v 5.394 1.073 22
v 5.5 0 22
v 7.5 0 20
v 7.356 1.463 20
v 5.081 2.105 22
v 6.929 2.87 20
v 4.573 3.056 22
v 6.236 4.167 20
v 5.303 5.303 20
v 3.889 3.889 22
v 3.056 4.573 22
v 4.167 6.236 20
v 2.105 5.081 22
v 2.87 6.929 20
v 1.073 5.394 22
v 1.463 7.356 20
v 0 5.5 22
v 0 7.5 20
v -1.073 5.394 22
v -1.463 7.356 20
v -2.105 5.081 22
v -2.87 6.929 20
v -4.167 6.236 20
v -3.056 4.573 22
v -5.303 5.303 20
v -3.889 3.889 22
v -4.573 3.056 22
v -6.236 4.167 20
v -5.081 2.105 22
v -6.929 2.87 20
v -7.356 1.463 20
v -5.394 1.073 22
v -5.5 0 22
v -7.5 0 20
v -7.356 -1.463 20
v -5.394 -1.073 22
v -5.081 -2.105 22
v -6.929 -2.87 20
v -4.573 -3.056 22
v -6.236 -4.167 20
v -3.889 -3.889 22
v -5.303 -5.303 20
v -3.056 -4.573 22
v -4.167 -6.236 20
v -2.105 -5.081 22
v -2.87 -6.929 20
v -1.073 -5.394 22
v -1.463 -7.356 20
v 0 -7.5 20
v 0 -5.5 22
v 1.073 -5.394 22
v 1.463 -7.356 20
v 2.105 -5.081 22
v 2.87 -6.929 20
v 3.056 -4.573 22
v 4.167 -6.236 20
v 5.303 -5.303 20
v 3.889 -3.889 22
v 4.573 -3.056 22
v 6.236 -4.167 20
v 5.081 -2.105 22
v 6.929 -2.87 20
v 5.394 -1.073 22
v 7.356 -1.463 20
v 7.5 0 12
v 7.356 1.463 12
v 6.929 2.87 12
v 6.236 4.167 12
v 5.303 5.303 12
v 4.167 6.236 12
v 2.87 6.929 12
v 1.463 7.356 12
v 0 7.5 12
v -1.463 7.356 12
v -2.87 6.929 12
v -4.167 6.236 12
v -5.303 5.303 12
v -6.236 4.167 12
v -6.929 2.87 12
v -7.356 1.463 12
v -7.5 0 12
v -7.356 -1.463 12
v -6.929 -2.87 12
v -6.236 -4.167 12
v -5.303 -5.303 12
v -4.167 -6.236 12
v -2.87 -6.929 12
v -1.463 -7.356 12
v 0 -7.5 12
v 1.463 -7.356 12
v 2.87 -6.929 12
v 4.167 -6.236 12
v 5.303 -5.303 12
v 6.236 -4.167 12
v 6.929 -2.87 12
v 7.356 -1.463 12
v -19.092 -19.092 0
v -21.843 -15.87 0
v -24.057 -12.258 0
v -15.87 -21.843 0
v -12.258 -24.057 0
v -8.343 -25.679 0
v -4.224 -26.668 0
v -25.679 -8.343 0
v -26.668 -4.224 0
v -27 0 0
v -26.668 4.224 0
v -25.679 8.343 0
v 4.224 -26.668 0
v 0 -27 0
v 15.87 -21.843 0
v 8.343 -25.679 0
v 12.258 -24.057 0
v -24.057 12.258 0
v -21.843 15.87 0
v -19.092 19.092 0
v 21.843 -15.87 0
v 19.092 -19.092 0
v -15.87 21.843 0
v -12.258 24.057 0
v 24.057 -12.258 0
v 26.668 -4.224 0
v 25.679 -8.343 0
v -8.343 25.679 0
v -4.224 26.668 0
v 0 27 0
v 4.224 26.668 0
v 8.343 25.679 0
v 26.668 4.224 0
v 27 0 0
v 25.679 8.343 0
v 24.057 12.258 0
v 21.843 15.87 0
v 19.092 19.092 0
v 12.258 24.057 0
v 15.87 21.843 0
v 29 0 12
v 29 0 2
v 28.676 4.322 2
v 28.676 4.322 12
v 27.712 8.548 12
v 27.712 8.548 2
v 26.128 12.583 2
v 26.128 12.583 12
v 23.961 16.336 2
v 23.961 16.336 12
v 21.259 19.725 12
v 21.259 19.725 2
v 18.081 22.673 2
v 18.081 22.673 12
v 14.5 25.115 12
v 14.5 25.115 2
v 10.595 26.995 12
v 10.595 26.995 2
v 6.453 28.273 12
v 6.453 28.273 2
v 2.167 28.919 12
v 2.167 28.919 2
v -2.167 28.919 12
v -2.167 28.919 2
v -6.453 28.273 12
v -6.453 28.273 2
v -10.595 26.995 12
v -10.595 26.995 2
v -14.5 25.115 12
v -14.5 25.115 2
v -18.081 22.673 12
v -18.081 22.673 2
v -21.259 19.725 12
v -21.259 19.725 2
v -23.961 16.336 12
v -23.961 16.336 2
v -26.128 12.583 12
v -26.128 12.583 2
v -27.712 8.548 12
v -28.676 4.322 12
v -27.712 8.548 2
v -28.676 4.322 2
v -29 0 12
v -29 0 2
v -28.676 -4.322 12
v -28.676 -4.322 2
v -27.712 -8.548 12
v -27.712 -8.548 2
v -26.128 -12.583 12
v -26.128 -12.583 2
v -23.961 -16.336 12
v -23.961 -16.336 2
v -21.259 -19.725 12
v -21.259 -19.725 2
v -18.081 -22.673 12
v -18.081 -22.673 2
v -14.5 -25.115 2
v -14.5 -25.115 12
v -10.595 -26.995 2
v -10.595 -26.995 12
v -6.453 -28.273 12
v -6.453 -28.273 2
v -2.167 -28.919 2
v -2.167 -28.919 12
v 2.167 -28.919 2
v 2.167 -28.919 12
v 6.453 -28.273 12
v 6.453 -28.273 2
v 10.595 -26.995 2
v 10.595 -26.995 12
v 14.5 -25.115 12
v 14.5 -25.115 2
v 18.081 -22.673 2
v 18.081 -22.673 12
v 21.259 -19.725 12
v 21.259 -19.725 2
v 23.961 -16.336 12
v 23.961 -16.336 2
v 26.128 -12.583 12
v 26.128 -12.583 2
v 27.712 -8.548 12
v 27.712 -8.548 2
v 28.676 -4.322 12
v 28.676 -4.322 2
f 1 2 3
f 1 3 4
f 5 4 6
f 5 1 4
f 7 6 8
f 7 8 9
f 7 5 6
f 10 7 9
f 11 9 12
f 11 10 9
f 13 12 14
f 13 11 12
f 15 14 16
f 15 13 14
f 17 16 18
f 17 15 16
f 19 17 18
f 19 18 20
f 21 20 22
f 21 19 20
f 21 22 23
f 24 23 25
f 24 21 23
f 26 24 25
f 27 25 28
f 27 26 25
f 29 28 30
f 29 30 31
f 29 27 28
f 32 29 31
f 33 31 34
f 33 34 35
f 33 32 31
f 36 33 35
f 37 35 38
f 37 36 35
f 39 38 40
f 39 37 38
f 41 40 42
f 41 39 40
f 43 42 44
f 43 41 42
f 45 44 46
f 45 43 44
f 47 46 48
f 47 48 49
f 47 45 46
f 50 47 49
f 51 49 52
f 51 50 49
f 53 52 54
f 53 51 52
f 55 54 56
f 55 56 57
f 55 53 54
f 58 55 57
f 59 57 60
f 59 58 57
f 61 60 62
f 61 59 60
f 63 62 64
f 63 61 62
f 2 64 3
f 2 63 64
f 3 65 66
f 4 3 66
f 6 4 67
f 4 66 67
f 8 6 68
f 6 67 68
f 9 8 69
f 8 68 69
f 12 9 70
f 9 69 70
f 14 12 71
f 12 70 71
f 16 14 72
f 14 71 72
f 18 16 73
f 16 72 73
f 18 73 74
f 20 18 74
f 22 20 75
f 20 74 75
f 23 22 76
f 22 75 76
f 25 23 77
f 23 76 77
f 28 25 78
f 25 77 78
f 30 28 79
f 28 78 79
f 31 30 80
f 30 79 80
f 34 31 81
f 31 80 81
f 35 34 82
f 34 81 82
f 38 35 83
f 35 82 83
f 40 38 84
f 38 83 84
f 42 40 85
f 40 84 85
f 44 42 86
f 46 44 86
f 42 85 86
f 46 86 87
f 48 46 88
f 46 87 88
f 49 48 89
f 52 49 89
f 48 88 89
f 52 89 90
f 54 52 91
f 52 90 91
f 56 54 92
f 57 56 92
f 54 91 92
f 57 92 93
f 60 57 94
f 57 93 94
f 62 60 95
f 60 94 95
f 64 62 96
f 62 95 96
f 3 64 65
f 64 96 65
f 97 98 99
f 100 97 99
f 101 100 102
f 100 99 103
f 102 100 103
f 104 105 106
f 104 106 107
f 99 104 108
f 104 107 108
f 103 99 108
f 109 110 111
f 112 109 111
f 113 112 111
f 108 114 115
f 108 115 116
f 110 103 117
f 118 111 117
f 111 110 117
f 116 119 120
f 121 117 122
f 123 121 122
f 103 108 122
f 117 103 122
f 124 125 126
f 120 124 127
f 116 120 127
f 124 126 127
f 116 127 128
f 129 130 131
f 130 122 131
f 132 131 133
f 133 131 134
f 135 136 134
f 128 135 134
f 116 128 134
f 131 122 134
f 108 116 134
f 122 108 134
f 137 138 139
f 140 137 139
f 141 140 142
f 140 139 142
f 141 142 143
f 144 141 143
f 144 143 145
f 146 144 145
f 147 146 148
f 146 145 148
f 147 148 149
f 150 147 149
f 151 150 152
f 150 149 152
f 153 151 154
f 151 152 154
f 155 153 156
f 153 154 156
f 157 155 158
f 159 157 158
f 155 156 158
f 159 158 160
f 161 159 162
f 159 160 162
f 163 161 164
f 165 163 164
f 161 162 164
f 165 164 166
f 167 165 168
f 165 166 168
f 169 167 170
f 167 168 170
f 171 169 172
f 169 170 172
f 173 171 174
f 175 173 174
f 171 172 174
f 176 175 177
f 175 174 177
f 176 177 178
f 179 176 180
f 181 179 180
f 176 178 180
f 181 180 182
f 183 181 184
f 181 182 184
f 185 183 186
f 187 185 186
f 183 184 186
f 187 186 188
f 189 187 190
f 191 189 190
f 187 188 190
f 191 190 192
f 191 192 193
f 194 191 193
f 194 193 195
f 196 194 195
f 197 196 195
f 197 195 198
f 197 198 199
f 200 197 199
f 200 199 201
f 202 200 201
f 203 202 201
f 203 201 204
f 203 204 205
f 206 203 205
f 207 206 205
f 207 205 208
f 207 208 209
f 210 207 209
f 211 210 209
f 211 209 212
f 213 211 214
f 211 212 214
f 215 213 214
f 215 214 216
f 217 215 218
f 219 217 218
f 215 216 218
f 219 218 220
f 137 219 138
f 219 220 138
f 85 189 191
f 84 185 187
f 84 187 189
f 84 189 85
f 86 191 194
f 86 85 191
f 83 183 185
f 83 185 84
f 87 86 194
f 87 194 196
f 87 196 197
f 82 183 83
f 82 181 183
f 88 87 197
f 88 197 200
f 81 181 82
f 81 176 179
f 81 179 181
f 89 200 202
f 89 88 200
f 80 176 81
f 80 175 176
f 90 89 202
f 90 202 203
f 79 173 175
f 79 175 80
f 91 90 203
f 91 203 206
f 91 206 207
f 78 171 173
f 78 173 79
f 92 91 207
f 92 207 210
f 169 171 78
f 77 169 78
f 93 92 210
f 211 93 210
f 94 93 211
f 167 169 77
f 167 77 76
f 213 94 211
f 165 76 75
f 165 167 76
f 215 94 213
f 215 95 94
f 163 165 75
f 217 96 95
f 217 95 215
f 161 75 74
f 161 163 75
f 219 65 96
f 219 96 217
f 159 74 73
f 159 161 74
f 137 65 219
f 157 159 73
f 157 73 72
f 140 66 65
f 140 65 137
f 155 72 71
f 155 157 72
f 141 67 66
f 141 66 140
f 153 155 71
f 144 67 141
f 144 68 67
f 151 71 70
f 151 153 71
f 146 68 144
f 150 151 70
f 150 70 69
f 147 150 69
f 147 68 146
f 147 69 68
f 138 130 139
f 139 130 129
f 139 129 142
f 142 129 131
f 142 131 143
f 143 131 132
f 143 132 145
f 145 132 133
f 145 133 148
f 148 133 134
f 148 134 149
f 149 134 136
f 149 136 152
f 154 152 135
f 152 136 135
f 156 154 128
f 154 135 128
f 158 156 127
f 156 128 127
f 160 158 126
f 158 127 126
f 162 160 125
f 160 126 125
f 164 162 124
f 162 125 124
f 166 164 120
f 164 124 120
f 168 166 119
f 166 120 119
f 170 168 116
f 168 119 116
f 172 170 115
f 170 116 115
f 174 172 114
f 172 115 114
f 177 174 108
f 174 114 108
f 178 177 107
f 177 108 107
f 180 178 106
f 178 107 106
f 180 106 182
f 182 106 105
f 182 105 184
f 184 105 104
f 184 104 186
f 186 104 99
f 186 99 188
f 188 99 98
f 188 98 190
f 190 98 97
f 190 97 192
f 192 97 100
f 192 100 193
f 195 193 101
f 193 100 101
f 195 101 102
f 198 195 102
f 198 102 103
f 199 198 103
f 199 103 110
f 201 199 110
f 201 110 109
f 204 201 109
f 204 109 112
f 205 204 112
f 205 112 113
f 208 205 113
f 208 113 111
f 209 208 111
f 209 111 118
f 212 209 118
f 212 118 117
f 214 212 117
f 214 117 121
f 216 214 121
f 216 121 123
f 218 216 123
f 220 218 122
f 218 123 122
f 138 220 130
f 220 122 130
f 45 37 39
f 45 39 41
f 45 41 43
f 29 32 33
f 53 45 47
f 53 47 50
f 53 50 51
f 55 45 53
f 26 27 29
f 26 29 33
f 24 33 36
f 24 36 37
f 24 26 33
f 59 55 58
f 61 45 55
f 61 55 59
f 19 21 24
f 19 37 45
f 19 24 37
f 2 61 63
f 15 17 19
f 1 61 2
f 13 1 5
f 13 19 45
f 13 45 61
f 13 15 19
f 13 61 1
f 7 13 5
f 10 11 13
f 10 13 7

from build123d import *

# Parameters (mm, degrees)
F0_R     = 29
F1_DEPTH = 12
F2_R     = 7.5
F3_DEPTH = 10
F4_SIZE  = 2
F5_SIZE  = 2


with BuildPart() as f1:
    # F0 (on Top) → F1 (new body)
    with BuildSketch(Plane.XY):
        Circle(F0_R)
    extrude(amount=F1_DEPTH)

    # F2 (on face) → F3 (join)
    with BuildSketch(Plane.XY.offset(12)):
        Circle(F2_R)
    extrude(amount=F3_DEPTH)

    # F4
    f4_edges = [f1.edges().sort_by_distance(p)[0] for p in [
        (-7.5, 0, 22),
    ]]
    chamfer(f4_edges, length=F4_SIZE)

    # F5
    f5_edges = [f1.edges().sort_by_distance(p)[0] for p in [
        (-29, 0, 0),
    ]]
    chamfer(f5_edges, length=F5_SIZE)


solid = f1.part
